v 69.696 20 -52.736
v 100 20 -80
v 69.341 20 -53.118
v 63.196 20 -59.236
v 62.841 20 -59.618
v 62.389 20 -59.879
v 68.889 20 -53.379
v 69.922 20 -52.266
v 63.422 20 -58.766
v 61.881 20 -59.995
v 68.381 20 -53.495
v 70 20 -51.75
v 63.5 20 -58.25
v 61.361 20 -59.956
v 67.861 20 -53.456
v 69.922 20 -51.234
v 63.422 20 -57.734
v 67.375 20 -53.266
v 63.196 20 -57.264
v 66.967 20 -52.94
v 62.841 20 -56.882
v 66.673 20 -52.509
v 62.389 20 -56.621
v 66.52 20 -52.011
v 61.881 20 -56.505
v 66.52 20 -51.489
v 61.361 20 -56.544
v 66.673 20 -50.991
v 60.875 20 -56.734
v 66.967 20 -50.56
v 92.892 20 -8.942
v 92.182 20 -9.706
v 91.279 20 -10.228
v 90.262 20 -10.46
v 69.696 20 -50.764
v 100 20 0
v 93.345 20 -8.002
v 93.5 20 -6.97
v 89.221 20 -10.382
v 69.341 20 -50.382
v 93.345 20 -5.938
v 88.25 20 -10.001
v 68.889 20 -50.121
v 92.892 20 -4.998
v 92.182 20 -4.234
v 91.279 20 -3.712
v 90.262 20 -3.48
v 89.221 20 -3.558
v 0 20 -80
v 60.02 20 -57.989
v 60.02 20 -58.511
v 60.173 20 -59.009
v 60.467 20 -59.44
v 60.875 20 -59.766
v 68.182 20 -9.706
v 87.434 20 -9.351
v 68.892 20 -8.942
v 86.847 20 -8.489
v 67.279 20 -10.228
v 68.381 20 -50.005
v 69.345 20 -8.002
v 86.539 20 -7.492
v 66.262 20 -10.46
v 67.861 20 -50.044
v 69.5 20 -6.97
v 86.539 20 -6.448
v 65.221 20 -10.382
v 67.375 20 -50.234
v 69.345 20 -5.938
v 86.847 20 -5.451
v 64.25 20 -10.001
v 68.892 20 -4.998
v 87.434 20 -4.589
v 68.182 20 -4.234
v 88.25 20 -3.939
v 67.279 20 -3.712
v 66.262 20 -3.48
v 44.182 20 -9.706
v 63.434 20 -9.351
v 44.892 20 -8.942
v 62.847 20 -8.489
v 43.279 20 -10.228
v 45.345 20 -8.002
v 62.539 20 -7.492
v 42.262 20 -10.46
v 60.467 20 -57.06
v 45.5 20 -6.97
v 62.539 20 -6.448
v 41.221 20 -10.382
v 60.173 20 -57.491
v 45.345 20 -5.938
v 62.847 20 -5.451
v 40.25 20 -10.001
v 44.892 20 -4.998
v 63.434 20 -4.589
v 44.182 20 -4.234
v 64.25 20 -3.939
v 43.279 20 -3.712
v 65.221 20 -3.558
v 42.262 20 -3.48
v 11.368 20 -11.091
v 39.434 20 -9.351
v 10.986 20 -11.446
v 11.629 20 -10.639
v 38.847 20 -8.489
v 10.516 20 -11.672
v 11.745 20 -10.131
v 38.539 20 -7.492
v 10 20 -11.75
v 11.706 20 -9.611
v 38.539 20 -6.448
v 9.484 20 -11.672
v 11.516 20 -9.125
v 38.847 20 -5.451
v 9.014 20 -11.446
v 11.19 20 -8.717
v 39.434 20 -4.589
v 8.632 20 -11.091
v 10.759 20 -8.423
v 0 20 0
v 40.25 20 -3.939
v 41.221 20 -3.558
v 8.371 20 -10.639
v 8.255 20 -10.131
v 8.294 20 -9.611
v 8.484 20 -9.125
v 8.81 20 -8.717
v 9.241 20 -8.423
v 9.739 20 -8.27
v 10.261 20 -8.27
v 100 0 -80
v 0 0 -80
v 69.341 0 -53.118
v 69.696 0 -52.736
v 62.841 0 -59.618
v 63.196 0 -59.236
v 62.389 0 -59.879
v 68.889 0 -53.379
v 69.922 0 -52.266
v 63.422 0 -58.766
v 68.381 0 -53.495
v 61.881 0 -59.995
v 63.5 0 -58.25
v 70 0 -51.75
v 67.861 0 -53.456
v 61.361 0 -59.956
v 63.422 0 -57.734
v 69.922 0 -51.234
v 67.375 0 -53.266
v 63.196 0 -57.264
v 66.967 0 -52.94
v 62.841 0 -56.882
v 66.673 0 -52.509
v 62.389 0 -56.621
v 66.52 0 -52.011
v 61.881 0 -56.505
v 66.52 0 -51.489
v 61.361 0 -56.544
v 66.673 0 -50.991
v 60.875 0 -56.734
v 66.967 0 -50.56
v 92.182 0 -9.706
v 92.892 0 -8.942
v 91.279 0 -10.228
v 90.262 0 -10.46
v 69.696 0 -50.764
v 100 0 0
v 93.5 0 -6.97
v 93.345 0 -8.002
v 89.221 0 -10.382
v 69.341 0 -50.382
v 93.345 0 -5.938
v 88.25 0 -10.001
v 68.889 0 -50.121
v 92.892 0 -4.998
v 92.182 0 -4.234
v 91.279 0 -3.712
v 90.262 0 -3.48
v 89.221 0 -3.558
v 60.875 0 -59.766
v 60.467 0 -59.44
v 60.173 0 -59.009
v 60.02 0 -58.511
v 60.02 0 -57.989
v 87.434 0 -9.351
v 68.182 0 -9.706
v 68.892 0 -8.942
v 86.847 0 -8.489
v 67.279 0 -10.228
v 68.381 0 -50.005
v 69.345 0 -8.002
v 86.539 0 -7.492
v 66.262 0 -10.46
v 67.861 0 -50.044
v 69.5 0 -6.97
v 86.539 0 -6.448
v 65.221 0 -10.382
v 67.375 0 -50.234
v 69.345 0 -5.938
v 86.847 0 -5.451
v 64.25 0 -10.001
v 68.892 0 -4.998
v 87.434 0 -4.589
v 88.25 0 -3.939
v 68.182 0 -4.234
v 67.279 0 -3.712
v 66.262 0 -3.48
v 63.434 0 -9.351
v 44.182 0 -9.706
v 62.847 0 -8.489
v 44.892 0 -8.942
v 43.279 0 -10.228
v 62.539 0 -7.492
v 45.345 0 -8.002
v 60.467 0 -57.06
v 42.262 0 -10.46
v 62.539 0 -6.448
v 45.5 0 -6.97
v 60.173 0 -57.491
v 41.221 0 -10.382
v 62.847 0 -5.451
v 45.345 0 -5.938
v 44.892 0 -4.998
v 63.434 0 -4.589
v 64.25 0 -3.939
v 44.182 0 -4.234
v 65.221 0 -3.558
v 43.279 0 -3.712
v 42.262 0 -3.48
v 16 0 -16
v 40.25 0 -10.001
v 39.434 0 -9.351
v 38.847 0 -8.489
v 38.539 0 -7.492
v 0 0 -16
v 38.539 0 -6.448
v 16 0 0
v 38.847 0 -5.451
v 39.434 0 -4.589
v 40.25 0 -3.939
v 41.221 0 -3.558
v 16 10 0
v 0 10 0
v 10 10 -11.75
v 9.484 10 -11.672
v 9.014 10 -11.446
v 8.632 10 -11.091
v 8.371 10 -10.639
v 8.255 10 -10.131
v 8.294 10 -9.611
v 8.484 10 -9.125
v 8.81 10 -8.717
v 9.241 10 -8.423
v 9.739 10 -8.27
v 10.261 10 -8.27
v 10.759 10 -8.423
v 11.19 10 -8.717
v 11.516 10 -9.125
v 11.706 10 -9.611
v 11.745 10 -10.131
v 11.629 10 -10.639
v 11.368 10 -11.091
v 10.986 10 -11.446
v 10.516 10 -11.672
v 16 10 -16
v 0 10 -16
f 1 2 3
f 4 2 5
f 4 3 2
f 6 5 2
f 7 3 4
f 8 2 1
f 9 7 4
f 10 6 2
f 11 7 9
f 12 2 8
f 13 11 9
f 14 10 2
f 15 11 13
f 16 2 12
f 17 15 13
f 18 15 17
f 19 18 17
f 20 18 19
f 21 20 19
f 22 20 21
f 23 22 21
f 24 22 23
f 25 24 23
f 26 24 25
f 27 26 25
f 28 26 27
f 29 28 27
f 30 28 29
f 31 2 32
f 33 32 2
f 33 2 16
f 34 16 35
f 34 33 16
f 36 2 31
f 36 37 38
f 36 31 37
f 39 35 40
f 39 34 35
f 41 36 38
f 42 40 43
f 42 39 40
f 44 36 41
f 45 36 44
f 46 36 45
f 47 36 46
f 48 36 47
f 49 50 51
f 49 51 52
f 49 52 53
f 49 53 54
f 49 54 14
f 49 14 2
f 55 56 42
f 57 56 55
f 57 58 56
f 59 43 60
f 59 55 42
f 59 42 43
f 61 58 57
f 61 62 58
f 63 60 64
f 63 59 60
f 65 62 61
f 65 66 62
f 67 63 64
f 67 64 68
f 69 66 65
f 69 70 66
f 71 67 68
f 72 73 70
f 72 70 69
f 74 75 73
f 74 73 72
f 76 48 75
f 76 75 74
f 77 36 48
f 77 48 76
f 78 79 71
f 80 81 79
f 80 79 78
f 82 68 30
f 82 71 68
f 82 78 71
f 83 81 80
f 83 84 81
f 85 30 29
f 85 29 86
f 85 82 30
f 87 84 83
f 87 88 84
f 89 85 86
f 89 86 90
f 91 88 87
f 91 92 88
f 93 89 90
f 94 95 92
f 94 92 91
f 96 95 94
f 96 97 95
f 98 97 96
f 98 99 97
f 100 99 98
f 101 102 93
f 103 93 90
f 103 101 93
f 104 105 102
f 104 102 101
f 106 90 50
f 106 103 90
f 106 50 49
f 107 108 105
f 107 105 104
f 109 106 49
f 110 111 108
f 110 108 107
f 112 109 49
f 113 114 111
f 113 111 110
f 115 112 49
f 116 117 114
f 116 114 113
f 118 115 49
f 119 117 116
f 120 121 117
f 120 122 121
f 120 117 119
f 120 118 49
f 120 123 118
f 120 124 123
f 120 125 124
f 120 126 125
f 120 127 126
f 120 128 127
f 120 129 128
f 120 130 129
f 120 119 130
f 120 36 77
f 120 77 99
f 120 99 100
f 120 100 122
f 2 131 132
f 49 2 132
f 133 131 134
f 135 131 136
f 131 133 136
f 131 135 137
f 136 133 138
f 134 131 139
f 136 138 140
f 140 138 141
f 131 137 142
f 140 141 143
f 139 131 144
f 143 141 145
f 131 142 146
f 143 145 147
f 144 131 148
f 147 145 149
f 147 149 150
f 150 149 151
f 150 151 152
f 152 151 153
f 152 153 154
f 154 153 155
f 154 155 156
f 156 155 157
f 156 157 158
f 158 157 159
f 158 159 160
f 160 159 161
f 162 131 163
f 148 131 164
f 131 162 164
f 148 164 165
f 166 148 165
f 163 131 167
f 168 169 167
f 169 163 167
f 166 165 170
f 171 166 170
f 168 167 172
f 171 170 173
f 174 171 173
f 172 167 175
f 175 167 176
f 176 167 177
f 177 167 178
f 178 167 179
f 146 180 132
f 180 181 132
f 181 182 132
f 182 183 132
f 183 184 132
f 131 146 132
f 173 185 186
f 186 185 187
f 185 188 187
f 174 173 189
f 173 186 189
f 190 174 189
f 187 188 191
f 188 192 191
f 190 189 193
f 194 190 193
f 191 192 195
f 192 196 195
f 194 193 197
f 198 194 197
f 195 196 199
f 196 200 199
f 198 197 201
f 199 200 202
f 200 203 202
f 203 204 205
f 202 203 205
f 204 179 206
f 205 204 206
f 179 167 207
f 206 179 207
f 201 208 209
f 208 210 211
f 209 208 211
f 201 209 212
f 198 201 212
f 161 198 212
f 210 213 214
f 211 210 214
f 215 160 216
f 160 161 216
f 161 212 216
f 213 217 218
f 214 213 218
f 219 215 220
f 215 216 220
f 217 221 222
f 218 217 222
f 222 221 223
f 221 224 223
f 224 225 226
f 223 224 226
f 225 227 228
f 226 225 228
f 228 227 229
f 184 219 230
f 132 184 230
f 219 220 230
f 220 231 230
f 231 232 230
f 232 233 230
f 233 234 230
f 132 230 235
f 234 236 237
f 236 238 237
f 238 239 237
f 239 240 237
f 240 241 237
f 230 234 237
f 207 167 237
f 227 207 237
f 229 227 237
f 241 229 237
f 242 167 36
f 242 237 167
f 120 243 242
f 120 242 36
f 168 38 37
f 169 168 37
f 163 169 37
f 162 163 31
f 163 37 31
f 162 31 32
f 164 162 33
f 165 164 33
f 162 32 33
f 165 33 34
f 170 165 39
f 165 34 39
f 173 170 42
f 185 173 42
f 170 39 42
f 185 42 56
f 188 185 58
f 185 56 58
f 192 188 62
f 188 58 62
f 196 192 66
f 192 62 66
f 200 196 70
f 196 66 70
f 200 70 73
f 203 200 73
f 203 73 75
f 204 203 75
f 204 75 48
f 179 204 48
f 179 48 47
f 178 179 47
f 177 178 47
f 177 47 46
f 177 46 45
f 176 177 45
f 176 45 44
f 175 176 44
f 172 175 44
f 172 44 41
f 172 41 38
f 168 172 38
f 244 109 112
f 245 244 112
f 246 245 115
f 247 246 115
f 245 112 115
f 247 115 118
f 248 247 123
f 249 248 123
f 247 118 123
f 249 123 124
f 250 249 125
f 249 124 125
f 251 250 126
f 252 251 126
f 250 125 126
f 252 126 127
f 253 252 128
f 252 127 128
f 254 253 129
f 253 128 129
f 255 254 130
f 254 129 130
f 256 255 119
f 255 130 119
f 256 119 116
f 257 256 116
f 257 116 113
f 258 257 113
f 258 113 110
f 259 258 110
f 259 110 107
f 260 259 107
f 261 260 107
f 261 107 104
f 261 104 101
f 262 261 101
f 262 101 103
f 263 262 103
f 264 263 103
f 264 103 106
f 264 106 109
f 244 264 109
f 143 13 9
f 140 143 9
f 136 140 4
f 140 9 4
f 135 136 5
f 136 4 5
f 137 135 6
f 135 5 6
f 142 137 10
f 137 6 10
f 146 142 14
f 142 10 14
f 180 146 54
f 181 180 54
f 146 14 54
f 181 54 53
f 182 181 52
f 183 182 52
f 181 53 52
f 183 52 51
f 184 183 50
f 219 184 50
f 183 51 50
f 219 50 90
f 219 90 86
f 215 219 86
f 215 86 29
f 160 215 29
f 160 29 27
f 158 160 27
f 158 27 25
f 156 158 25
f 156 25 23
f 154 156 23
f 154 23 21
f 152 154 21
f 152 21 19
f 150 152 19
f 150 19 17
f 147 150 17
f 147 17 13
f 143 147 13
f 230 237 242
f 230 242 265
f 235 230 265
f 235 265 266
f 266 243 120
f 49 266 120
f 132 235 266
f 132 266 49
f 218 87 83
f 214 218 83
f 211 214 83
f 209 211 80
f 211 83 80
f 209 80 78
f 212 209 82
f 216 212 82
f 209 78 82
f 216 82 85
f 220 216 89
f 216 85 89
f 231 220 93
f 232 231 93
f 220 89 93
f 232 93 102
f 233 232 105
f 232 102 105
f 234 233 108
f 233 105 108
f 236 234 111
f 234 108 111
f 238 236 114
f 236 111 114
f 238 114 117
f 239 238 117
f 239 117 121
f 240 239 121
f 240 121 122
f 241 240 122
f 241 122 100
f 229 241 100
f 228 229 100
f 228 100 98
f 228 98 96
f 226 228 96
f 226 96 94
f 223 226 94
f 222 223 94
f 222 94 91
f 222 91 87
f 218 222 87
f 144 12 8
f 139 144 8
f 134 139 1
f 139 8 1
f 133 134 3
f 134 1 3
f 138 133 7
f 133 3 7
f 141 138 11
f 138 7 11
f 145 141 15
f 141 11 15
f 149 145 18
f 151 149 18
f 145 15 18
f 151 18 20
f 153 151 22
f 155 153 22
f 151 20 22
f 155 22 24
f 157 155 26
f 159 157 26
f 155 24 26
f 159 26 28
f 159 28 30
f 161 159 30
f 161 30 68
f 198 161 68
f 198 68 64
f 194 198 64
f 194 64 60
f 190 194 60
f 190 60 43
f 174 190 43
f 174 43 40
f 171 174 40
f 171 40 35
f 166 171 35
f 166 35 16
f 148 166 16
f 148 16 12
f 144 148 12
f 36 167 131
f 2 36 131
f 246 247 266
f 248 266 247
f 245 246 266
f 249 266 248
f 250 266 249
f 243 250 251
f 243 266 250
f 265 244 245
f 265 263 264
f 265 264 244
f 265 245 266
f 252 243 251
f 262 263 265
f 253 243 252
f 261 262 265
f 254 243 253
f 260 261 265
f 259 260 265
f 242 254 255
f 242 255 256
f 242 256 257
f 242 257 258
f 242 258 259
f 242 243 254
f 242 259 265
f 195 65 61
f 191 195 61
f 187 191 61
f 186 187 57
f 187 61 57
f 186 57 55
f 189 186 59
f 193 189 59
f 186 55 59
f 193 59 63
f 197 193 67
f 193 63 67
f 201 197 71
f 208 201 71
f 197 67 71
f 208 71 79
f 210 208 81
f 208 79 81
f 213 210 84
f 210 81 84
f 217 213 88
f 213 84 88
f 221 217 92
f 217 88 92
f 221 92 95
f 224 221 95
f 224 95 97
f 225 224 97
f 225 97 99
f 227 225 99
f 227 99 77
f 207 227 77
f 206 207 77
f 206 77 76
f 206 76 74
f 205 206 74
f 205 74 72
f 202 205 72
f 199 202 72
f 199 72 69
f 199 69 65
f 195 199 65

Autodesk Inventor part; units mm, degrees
ref_plane "YZ Plane" through (0, 0, 0) normal (1, 0, 0) x (0, 1, 0)
ref_plane "XZ Plane" through (0, 0, 0) normal (0, 1, 0) x (-1, 0, 0)
ref_plane "XY Plane" through (0, 0, 0) normal (0, 0, 1) x (1, 0, 0)
sketch "Boceto1" plane through (0, 0, 0) normal (0, 1, 0) x (-1, 0, 0)
  line L0 (100, 80) -> (-100, 80)
  line L1 (-100, 80) -> (-100, -80)
  line L2 (-100, -80) -> (100, -80)
  line L3 (100, -80) -> (100, 80)
  line L4 (100, 80) -> (-100, -80) construction
  line L5 (-100, 80) -> (100, -80) construction
  point P0 (0, 0)
  dimension "d0" = 200
  dimension "d1" = 160
extrude "Extrusión1" add sketch "Boceto1" along normal blind 20
sketch "Boceto2" plane through (0, 20, 0) normal (0, 1, 0) x (1, 0, 0)
  circle A0 centre (-90, -57.83) radius 3.5
  line L0 (-100, -65.43) -> (-32, -65.43)
  line L1 (-32, -65.43) -> (-32, 14.57)
  line L2 (-32, 14.57) -> (-100, 14.57)
  line L3 (-100, 14.57) -> (-100, -65.43)
  line L4 (-66, -65.43) -> (-66, -8.508)
  circle A1 centre (-66, -57.83) radius 3.5
  circle A2 centre (-42, -57.83) radius 3.5
  line L5 (-32, -25.43) -> (-48.2072, -25.43)
  circle A3 centre (-42, 6.97) radius 3.5
  circle A4 centre (-66, 6.97) radius 3.5
  circle A5 centre (-90, 6.97) radius 3.5
  circle A6 centre (-60, 55) radius 5
  line L6 (-100, 80) -> (-100, -80) projected
  line L7 (0, 0) -> (0, -20.5185)
  circle A7 centre (90, -57.83) radius 3.5
  circle A8 centre (66, -57.83) radius 3.5
  circle A9 centre (42, -57.83) radius 3.5
  line L8 (100, -65.43) -> (32, -65.43)
  line L9 (66, -65.43) -> (66, -8.508)
  line L10 (32, -25.43) -> (48.2072, -25.43)
  circle A10 centre (90, 6.97) radius 3.5
  line L11 (100, 14.57) -> (100, -65.43)
  circle A11 centre (66, 6.97) radius 3.5
  line L12 (32, 14.57) -> (100, 14.57)
  line L13 (32, -65.43) -> (32, 14.57)
  circle A12 centre (42, 6.97) radius 3.5
  circle A13 centre (60, 55) radius 5
  line L14 (100, 80) -> (100, -80)
  dimension "d4" = 7
  dimension "d5" = 68
  dimension "d6" = 80
  dimension "d7" = 7.6
  dimension "d8" = 10
  dimension "d9" = 7
  dimension "d10" = 24
  dimension "d11" = 10
  dimension "d16" = 0
  dimension "d19" = 40
extrude "Extrusión2" cut sketch "Boceto2" against normal blind 20 contours A0 | A1 L4 | L4 A1 | A2 | A3 | A4 | A5 | A7 | A8 L9 | L9 A8 | A9 | A10 | A11 | A12
sketch "Boceto3" plane through (-100, 0, 80) normal (0, 0, 1) x (1, 0, 0)
  line L0 (0, 20) -> (30, 20)
  line L1 (30, 20) -> (30, 10)
  line L2 (30, 10) -> (0, 10)
  line L3 (0, 10) -> (0, 20)
  line L4 (100, 0) -> (100, 11.6249)
  line L5 (200, 20) -> (170, 20)
  line L6 (170, 20) -> (170, 10)
  line L7 (170, 10) -> (200, 10)
  line L8 (200, 10) -> (200, 20)
  dimension "d22" = 30
  dimension "d23" = 10
extrude "Extrusión3" add sketch "Boceto3" along normal blind 40
sketch "Boceto4" plane through (0, 20, 0) normal (0, 1, 0) x (1, 0, 0)
  line L0 (-60, 60) -> (-60, 50)
  line L1 (-70, 50) -> (-70, 60)
  line L2 (-60, 50) -> (-70, 60) construction
  line L3 (-70, 50) -> (-60, 60) construction
  line L4 (-60, 50) -> (-70, 50)
  circle A0 centre (-68.25, 51.75) radius 1.75
  line L5 (-70, 60) -> (-60, 60)
  circle A1 centre (-61.75, 58.25) radius 1.75
  line L6 (100, 80) -> (-100, 80) projected
  line L7 (0, 80) -> (0, 60)
  line L8 (60, 60) -> (60, 50)
  circle A2 centre (61.75, 58.25) radius 1.75
  line L9 (70, 60) -> (60, 60)
  line L10 (70, 50) -> (70, 60)
  line L11 (60, 50) -> (70, 60) construction
  line L12 (70, 50) -> (60, 60) construction
  line L13 (60, 50) -> (70, 50)
  circle A3 centre (68.25, 51.75) radius 1.75
  line L14 (-100, 80) -> (-100, -120) projected
  line L15 (100, 80) -> (100, -120) projected
  point P0 (0, 0)
  point P1 (-70.0286, 64.971)
  point P2 (-65, 50)
  point P3 (70.0286, 64.971)
  point P4 (65, 50)
  dimension "d26" = 1.75
  dimension "d27" = 8.25
  dimension "d28" = 20
  dimension "d29" = 10
  dimension "d30" = 10
  dimension "d31" = 1.75
  dimension "d32" = 1.75
  dimension "d33" = 1.75
  dimension "d58" = 30
  dimension "d59" = 30
extrude "Extrusión4" cut sketch "Boceto4" against normal blind 40 contours A1 | A0 | A2 | A3
sketch "Boceto5" plane through (0, 20, 0) normal (0, 1, 0) x (1, 0, 0)
  line L0 (-100, -80) -> (-100, -120)
  line L1 (-70.0001, -120) -> (-70.0001, -80)
  line L2 (-55.1959, -79.9497) -> (-70.0001, -80)
  line L3 (-70.0001, -80) -> (-100, -80)
  line L4 (-100, -120) -> (-70.0001, -120)
  line L5 (-64.3507, -80) -> (-74.3507, -80)
  circle A0 centre (-81.75, -108.25) radius 1.75
  circle A1 centre (-88.25, -101.75) radius 1.75
  line L6 (-70.0001, -80) -> (70.0001, -80)
  line L7 (0, -80) -> (0, -101.75)
  circle A2 centre (81.75, -108.25) radius 1.75
  circle A3 centre (88.25, -101.75) radius 1.75
  line L8 (-70, -80) -> (70, -80) projected
  line L9 (-100, 80) -> (-100, -120) projected
  point P0 (0, 0)
  point P1 (-81.75, -101.75)
  point P2 (-63.4459, -118.25)
  point P3 (81.75, -101.75)
  dimension "d36" = 11.7499
  dimension "d37" = 40
  dimension "d38" = 29.9999
  dimension "d39" = 21.75
  dimension "d40" = 11.75
  dimension "d41" = 28.3003
  dimension "d42" = 11.7499
  dimension "d43" = 0
  dimension "d44" = 0
hole "Agujero1" at (-88.25, 20, 101.75) at (-81.75, 20, 108.25) at (81.75, 20, 108.25) at (88.25, 20, 101.75) direction (0, -1, 0) diameter 3.5 end through all
ref_plane "Plano de trabajo1" through (100, 0, 0) normal (0, 0, -1) x (-1, 0, 0)
ref_plane "Plano de trabajo2" through (0, 0, -80) normal (-1, 0, 0) x (0, 0, 1)
sketch "Boceto6" plane through (0, 0, 0) normal (0, -1, 0) x (1, 0, 0)
  circle A0 centre (10, -10) radius 1.75
  line L0 (6.803, 0) -> (14.6069, 0)
  line L1 (0, 0) -> (0, -4.8284)
  line L2 (0, 0) -> (20.0354, 0)
  circle A1 centre (10, 10) radius 1.75
  line L3 (0, 0) -> (0, 4.8284)
  circle A2 centre (-10, 10) radius 1.75
  circle A3 centre (-10, -10) radius 1.75
  dimension "d63" = 3.5
  dimension "d64" = 10
  dimension "d65" = 10
hole "Agujero2" at (10, 0, 10) at (-10, 0, 10) at (-10, 0, -10) at (10, 0, -10) direction (0, 1, 0) diameter 3.5 end through all
sketch "Boceto7" plane through (0, 0, 0) normal (0, -1, 0) x (1, 0, 0)
  line L0 (-16, 16) -> (16, 16)
  line L1 (16, 16) -> (16, -16)
  line L2 (16, -16) -> (-16, -16)
  line L3 (-16, -16) -> (-16, 16)
  line L4 (-16, 16) -> (16, -16) construction
  line L5 (16, 16) -> (-16, -16) construction
  point P0 (0, 0)
  point P1 (0, 0)
  point P2 (0, 0)
  dimension "d73" = 32
  dimension "d74" = 32
extrude "Extrusión5" cut sketch "Boceto7" against normal blind 10
sketch "Boceto8" plane through (0, 20, 0) normal (0, 1, 0) x (1, 0, 0)
  line L0 (-15, -60) -> (15, -60)
  circle A0 centre (10, -65) radius 1.75
  line L1 (-10, -65) -> (10, -65)
  line L2 (15, -60) -> (15, -70)
  circle A1 centre (-10, -65) radius 1.75
  line L3 (-15, -70) -> (15, -60) construction
  line L4 (-15, -60) -> (15, -70) construction
  line L5 (-15, -70) -> (-15, -60)
  line L6 (15, -70) -> (-15, -70)
  point P0 (0, 0)
  point P1 (0, -69.1269)
  point P2 (-15, -67.1661)
  point P3 (0, -69.1269)
  point P4 (15, -65)
  dimension "d77" = 10
  dimension "d78" = 30
  dimension "d79" = 5
  dimension "d80" = 5
  dimension "d81" = 5
  dimension "d82" = 5
hole "Agujero3" at (-10, 20, 65) at (10, 20, 65) direction (0, -1, 0) diameter 3.5 end through all
split "Dividir1" plane through (100, 0, 0) removes the side toward (0, 0, 1)
split "Dividir2" plane through (0, 0, -80) removes the side toward (-1, 0, 0)
properties part number "base_back_2"
